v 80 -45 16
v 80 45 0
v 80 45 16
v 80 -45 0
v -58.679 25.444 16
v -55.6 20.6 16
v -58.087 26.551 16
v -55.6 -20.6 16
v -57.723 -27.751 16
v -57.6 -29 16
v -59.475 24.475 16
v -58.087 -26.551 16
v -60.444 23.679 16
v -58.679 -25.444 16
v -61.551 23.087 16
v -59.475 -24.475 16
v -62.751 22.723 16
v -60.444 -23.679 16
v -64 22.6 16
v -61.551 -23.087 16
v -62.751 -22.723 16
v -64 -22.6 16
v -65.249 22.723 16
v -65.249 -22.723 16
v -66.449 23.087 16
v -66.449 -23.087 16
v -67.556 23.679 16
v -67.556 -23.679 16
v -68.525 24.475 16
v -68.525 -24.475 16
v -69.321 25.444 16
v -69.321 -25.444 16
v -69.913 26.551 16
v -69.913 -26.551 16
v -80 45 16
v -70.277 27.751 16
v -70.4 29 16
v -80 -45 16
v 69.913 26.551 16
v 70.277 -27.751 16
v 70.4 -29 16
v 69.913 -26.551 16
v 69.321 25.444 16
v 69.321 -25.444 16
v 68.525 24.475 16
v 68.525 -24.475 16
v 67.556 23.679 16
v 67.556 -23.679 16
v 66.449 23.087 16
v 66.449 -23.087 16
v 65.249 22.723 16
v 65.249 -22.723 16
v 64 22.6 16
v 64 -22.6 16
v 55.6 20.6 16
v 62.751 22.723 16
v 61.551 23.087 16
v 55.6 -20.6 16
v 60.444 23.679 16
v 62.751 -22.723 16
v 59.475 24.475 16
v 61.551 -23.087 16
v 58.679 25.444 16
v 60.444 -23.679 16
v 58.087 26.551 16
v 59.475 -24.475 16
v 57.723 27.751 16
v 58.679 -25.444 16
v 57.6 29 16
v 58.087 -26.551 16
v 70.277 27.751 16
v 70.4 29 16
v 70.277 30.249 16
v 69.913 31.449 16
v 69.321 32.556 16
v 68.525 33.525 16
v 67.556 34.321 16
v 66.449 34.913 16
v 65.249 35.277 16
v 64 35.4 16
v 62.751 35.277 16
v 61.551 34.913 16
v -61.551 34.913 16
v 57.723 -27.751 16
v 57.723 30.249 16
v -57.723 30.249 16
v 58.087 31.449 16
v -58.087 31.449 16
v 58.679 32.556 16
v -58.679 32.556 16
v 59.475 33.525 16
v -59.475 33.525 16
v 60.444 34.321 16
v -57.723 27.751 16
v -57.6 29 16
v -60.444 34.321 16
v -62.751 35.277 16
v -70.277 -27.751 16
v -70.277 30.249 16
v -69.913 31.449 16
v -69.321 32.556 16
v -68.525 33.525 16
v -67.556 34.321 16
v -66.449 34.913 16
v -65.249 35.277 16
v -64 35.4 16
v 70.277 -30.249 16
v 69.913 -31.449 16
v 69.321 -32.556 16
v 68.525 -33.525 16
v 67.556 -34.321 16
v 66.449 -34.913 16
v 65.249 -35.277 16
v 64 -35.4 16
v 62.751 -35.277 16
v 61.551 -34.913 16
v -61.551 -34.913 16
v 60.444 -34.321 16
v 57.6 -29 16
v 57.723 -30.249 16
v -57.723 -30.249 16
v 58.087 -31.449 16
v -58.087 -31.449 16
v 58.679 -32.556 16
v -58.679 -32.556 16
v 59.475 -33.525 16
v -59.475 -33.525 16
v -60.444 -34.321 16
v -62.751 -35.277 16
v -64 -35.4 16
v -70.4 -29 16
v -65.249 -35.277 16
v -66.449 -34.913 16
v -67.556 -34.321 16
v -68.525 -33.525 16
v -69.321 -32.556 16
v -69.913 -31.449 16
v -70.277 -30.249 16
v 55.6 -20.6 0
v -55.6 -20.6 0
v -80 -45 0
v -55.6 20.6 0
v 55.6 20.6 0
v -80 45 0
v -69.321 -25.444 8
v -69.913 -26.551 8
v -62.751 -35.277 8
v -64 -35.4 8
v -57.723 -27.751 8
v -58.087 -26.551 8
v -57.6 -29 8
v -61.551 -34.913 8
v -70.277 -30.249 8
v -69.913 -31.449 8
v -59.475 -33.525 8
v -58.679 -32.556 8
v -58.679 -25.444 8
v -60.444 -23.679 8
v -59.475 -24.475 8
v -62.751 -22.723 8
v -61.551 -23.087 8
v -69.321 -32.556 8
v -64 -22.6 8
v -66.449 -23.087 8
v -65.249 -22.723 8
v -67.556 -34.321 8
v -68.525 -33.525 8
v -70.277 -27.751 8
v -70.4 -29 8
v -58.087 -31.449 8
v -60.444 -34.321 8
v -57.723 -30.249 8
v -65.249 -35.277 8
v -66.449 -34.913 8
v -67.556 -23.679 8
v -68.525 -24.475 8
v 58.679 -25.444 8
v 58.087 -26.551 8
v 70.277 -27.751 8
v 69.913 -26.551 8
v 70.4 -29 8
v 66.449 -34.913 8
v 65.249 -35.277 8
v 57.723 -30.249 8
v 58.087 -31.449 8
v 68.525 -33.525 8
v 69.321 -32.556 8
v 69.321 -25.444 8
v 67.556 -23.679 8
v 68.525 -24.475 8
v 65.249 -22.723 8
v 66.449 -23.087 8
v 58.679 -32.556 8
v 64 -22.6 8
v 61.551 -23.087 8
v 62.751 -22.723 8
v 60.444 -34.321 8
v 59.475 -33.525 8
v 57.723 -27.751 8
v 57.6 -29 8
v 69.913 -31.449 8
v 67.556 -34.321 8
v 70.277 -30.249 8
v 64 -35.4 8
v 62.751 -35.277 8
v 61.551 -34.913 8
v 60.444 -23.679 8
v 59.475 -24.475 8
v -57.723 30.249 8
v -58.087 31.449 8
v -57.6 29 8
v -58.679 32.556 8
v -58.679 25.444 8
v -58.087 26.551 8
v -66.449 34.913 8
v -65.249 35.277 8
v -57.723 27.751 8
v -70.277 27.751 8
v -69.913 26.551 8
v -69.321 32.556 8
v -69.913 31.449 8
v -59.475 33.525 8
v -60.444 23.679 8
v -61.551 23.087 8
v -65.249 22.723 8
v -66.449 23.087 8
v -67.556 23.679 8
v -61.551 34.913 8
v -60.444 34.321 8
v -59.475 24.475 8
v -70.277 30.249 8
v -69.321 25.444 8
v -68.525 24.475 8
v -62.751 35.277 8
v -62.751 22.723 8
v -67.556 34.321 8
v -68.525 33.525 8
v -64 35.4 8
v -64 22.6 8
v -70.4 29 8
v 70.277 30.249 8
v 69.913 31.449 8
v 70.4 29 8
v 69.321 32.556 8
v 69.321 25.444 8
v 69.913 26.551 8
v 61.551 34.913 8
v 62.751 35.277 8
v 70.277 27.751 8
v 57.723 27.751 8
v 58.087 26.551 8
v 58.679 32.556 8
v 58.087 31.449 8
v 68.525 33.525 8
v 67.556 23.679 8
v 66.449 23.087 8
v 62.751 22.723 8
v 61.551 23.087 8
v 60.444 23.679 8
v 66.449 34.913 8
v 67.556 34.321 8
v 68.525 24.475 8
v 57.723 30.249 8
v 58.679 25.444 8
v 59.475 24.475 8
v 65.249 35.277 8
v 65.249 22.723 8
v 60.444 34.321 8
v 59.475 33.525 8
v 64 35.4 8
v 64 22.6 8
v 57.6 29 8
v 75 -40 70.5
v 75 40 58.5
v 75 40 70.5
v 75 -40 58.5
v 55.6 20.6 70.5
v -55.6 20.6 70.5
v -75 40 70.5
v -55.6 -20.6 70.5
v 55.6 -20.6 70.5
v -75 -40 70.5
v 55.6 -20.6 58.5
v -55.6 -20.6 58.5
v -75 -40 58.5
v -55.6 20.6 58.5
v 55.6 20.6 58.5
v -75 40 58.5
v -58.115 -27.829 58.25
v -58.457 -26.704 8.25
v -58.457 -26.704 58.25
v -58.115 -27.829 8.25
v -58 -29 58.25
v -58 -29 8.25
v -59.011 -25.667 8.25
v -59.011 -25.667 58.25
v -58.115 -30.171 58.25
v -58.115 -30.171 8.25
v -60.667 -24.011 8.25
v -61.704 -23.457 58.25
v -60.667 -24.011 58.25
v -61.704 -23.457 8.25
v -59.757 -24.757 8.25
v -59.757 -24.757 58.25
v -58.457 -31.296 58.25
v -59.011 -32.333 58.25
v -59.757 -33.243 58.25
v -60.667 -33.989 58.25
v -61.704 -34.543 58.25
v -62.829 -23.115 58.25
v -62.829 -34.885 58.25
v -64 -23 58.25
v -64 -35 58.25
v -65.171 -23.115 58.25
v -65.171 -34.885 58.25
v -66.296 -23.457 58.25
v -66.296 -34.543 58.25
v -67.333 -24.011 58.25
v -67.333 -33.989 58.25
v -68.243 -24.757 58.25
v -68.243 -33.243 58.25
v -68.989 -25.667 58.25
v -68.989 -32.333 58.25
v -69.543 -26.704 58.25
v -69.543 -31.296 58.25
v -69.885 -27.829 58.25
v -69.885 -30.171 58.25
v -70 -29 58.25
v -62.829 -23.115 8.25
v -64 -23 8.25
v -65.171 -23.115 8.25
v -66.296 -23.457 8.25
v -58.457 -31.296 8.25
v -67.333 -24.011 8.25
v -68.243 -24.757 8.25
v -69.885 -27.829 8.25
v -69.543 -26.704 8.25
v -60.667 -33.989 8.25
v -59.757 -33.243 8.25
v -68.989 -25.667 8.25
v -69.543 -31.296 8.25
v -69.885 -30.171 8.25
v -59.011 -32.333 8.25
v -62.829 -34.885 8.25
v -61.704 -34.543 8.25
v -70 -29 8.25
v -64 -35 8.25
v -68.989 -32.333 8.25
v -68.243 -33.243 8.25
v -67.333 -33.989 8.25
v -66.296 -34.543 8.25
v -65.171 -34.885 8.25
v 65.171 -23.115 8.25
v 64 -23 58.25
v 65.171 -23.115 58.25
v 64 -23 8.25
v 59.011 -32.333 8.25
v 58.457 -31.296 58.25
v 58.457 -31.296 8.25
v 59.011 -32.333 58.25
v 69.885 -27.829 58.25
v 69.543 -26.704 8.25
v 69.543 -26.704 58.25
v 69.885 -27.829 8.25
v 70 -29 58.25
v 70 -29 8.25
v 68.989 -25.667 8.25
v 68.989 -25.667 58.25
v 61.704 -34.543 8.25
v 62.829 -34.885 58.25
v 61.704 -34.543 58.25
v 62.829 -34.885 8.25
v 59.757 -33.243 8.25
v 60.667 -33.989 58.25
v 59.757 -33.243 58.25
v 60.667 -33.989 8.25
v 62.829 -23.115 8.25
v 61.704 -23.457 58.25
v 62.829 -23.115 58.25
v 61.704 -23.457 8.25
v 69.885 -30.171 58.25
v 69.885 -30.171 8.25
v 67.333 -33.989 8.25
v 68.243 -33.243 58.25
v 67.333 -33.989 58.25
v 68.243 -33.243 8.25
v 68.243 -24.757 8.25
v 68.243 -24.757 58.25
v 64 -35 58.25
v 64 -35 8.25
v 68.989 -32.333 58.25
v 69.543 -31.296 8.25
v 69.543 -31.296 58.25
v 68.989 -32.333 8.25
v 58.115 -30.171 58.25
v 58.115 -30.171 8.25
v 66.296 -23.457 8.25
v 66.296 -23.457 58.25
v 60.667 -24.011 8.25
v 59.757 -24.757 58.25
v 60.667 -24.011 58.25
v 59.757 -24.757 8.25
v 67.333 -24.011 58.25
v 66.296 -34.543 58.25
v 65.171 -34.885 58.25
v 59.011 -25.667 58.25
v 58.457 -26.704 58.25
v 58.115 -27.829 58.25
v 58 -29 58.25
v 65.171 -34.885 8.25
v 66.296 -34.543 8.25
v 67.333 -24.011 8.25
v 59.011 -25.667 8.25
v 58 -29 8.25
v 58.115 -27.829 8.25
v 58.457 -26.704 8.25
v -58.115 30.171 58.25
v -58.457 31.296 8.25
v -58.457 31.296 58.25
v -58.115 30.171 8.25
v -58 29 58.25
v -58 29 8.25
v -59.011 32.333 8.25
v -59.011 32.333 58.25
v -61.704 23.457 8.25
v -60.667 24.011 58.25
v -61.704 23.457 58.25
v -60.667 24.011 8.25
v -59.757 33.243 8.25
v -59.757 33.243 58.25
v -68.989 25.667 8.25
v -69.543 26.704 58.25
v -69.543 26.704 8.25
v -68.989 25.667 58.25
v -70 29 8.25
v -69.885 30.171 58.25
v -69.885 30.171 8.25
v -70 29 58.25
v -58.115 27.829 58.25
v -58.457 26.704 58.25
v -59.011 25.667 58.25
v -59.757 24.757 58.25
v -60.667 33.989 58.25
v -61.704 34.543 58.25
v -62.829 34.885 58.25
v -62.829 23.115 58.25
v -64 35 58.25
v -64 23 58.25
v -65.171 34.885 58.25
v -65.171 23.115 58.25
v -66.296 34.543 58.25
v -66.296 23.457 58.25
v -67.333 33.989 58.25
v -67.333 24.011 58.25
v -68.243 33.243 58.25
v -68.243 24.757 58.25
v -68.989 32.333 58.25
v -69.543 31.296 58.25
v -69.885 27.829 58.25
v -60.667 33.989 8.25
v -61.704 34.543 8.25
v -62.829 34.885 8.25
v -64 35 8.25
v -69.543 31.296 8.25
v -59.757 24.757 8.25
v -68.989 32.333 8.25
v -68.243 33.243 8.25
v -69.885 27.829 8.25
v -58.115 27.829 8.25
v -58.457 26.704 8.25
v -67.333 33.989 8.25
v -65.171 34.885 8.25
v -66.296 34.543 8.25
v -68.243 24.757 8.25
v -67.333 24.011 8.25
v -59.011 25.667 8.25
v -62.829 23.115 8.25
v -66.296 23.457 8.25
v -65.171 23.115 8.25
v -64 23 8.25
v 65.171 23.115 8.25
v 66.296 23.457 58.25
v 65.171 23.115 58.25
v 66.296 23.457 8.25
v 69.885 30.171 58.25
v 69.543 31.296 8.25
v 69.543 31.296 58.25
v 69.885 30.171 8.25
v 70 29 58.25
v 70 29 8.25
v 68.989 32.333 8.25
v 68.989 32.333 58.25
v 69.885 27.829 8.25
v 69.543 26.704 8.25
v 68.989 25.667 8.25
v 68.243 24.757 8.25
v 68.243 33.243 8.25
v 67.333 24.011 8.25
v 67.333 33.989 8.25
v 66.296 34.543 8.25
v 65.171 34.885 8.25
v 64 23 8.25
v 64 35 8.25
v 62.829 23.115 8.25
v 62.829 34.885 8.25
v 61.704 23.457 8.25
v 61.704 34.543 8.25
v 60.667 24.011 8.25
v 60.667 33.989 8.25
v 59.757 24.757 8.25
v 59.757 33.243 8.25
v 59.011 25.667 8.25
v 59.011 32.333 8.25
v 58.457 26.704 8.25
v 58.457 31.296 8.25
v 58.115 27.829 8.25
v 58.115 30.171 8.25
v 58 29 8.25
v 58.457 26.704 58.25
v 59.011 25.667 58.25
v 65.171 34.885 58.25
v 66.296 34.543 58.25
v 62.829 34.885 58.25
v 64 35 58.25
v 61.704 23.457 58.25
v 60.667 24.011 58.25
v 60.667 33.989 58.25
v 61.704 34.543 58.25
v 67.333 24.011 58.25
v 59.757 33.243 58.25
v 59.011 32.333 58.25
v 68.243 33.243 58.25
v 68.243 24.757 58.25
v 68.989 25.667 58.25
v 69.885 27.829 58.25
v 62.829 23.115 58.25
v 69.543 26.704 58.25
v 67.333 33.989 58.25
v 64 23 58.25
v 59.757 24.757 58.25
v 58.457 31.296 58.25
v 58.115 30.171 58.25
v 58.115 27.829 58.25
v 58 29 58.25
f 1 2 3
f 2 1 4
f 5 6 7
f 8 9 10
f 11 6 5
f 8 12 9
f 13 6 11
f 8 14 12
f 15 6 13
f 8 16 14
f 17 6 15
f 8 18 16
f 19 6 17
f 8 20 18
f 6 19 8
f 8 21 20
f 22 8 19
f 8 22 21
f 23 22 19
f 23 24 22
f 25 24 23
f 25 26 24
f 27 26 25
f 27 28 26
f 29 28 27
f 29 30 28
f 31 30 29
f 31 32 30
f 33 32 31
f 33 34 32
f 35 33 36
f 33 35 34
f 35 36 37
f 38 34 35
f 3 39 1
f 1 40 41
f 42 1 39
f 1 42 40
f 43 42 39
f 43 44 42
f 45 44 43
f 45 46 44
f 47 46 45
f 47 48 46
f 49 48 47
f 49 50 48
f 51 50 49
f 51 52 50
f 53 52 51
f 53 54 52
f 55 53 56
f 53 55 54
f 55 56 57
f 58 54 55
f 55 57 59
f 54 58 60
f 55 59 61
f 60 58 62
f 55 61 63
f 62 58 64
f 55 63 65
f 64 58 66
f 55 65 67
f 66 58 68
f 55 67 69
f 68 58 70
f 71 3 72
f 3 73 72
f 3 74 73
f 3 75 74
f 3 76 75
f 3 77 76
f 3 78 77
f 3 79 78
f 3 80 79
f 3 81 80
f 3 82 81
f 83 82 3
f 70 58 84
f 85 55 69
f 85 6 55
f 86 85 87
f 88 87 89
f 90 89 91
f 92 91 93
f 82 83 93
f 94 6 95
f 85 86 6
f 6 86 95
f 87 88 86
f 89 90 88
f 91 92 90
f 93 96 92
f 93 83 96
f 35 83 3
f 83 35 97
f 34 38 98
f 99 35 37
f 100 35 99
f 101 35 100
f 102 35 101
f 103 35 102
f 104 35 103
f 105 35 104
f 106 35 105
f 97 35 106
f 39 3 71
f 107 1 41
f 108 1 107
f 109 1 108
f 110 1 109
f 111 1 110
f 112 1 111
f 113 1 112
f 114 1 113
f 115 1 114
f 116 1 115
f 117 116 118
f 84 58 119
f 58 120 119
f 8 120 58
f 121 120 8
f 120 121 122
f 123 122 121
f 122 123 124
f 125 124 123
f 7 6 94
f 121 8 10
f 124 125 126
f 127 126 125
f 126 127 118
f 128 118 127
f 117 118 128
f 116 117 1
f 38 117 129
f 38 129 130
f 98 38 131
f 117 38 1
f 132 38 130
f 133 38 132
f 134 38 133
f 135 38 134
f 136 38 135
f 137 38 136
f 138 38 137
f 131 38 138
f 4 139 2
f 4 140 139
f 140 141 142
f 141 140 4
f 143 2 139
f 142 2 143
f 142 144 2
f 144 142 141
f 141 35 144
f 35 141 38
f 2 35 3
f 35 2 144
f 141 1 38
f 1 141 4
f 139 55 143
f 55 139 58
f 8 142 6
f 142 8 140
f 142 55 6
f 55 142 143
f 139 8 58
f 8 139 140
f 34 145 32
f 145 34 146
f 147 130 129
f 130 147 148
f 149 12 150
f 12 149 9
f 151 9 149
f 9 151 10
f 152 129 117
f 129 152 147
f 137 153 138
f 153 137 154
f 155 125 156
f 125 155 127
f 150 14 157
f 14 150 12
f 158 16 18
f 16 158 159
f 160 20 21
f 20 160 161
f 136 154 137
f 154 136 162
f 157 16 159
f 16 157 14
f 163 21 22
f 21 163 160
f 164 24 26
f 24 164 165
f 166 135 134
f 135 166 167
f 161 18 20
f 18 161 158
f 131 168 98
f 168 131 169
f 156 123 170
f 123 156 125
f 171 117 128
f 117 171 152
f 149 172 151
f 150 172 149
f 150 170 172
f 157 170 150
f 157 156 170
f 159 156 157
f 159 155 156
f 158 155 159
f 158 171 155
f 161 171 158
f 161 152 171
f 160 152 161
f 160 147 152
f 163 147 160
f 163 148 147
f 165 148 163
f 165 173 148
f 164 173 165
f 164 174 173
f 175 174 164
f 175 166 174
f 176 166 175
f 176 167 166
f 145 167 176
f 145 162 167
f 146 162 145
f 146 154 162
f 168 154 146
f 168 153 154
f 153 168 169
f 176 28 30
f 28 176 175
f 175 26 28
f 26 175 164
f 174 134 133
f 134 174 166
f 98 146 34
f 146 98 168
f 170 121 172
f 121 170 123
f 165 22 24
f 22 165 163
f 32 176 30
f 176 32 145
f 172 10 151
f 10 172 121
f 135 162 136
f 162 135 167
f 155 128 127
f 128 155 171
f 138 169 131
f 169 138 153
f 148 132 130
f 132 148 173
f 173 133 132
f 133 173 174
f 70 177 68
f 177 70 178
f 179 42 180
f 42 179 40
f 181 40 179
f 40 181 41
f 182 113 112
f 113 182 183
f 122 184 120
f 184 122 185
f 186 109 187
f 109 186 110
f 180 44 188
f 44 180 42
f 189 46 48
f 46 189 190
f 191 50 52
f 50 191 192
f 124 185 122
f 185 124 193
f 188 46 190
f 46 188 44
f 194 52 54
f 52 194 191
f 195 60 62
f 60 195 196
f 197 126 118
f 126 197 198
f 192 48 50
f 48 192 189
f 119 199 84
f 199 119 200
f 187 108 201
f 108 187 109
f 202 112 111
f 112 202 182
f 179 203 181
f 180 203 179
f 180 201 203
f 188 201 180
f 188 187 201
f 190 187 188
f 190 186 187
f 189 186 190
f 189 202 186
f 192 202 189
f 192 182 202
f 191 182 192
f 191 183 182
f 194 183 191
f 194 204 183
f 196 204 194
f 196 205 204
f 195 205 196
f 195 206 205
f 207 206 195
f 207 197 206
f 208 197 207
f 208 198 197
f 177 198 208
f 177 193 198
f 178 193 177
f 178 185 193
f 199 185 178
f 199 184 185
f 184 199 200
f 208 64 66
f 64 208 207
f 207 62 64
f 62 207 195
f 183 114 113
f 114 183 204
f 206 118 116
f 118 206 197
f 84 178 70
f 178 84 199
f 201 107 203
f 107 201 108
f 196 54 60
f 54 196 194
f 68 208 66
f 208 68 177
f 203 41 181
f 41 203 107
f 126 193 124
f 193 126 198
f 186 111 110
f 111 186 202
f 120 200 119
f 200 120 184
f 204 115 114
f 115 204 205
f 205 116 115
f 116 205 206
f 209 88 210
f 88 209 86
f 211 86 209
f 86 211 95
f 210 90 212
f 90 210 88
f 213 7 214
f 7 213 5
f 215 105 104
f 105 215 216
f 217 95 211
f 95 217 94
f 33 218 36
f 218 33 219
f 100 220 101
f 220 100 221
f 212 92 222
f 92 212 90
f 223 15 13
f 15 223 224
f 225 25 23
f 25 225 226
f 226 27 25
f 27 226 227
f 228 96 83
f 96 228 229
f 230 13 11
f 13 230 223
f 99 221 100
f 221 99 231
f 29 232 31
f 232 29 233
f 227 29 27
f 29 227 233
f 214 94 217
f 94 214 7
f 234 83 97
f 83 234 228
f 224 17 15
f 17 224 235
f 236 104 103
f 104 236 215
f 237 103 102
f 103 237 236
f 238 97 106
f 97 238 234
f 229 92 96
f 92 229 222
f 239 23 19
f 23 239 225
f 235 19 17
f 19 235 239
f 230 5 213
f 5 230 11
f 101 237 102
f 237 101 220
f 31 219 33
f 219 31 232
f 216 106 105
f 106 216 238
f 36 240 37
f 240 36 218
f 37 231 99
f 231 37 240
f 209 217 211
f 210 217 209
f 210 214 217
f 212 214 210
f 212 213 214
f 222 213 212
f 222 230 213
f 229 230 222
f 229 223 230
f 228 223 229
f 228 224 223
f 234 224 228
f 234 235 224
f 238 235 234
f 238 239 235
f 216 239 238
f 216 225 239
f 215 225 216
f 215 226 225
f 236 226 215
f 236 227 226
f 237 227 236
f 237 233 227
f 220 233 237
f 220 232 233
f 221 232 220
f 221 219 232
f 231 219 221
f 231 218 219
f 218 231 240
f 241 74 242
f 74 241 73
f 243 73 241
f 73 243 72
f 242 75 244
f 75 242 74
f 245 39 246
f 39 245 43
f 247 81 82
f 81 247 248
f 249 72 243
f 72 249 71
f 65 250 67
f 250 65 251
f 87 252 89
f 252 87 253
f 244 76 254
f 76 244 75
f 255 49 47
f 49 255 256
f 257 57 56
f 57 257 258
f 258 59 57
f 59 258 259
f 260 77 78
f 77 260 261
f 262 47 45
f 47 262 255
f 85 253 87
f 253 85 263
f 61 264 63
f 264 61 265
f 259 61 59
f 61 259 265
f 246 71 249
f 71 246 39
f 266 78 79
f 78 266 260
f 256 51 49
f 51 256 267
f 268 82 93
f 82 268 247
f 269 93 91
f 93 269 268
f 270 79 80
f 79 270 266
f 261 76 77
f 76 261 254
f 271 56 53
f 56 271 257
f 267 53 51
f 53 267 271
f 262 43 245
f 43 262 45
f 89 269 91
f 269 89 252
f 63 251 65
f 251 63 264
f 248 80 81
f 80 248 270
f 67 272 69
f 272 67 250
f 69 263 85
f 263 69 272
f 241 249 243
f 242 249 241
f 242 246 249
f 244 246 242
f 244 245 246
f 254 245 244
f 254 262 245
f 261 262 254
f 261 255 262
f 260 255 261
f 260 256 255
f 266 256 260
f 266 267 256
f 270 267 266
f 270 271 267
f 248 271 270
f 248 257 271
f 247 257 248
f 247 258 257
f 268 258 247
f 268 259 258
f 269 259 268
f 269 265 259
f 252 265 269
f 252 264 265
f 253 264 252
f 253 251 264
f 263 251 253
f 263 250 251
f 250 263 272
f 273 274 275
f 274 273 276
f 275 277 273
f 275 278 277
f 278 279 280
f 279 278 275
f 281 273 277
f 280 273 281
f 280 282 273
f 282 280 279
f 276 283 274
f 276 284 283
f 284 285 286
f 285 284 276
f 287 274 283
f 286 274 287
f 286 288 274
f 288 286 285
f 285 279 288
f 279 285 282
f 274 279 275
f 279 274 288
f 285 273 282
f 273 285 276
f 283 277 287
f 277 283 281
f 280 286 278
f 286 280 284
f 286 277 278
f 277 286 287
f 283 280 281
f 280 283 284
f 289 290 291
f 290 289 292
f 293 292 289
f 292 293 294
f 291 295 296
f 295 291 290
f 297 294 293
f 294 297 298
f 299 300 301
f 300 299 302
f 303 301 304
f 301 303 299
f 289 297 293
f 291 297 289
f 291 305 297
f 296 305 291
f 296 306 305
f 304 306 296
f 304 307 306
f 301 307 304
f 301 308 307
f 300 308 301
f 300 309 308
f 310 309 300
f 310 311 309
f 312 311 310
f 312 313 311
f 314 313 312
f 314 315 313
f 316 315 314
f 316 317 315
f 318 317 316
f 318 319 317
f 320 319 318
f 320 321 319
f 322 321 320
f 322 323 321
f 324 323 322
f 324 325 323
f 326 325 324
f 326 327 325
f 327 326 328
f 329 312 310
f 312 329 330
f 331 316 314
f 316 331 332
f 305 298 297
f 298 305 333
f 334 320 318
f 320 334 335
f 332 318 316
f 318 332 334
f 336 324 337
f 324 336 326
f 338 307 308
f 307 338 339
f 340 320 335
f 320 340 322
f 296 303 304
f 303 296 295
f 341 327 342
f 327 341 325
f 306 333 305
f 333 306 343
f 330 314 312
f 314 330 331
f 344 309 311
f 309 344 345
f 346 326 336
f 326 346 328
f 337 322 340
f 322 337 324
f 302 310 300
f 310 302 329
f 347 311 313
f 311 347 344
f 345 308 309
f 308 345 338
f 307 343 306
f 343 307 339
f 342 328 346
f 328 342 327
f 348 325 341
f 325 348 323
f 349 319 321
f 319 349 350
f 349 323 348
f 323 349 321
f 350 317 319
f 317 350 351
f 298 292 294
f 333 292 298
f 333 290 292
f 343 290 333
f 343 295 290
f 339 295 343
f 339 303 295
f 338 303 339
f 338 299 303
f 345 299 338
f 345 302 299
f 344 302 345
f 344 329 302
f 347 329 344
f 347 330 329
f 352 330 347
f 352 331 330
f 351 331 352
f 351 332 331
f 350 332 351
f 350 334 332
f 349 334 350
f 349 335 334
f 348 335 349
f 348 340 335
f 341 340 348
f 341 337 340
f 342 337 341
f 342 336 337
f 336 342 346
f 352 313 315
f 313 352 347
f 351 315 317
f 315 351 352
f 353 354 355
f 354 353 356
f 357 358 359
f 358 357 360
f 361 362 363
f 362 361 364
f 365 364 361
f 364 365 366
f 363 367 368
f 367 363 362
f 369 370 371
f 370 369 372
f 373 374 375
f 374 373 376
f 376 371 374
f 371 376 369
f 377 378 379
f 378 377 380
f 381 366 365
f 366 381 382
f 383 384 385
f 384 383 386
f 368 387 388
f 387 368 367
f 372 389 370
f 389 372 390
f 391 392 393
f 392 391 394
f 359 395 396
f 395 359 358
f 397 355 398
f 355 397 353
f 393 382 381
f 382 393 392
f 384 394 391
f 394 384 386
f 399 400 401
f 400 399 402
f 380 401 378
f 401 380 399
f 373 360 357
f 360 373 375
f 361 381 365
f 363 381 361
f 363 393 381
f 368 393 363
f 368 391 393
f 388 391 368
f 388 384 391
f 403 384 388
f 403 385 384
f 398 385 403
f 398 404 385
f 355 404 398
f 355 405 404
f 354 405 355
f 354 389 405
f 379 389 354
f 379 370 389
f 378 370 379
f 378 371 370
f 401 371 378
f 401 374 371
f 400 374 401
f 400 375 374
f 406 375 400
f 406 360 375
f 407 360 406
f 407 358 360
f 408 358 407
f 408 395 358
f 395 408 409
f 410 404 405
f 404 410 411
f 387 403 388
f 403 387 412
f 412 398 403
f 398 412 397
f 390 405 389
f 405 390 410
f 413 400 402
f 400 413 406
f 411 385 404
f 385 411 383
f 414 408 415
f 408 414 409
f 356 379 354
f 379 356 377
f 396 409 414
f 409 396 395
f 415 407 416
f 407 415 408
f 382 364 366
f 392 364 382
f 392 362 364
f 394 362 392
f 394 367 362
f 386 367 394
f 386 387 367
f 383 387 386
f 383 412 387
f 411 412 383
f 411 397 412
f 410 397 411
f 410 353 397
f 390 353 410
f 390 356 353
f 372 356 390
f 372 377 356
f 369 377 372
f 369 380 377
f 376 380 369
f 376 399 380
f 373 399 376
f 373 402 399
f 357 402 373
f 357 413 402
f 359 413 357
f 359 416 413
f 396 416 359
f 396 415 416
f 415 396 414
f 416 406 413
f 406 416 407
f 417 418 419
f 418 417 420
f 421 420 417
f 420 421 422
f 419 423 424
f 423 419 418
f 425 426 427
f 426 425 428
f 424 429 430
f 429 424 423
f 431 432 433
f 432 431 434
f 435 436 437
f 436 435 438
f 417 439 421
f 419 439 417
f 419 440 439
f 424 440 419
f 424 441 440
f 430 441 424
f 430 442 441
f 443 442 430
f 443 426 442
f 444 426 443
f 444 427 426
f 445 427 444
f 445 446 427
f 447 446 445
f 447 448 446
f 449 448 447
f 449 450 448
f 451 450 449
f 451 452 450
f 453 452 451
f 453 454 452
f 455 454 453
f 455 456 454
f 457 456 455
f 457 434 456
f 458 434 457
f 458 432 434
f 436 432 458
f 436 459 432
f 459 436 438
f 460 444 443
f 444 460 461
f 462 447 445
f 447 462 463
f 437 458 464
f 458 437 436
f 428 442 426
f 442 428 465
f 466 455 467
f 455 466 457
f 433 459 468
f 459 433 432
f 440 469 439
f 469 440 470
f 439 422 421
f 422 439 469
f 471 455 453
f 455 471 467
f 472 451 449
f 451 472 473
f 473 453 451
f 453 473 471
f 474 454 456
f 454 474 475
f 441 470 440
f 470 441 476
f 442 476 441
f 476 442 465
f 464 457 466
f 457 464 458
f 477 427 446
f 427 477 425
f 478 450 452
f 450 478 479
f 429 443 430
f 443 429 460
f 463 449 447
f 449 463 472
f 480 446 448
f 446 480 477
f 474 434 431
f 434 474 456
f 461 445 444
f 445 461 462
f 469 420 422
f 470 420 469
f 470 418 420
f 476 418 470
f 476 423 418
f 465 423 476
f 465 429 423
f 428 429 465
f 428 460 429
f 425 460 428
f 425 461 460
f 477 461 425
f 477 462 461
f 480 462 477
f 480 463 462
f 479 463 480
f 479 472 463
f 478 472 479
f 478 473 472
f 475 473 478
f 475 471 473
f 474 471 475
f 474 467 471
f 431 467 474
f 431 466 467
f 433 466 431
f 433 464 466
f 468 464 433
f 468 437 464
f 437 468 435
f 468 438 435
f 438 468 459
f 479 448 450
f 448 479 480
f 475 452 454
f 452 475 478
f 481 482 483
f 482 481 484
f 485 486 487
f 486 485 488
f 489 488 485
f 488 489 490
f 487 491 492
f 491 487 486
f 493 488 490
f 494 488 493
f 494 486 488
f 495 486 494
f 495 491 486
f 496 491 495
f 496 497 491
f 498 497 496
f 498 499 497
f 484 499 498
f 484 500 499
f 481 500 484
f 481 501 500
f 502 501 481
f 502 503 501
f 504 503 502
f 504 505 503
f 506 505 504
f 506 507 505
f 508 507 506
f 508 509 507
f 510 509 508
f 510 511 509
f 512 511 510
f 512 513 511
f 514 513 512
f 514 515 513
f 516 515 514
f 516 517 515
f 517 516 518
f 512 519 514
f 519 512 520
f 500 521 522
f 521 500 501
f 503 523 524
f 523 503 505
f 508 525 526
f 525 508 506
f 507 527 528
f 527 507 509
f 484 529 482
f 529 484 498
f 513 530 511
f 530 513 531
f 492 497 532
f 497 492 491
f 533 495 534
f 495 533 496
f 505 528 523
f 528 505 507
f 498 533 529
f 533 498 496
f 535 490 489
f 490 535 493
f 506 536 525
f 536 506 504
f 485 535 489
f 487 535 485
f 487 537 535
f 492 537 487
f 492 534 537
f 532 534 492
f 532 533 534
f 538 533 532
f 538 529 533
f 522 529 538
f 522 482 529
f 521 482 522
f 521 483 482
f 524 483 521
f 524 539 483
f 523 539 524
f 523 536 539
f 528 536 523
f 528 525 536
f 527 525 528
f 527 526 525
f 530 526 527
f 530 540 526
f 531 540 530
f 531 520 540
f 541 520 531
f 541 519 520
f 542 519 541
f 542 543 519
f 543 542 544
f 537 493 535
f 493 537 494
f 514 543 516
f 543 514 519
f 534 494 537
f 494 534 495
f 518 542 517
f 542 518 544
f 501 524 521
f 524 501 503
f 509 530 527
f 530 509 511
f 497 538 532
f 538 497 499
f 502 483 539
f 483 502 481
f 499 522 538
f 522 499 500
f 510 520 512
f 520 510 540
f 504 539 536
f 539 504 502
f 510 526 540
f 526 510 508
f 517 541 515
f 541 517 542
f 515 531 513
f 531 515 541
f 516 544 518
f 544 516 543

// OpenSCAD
$fn = 32;

// ------------------------------------------------------------------------
// Frame cube: base 160 x 90 mm, posts 50 mm tall
// Every part is its own module, assembly() places every instance.
// ------------------------------------------------------------------------

// --- part 1 ---
module base_frame() {
  difference() {
    translate([-80, -45, 0]) cube([160, 90, 16]);
    translate([-55.6, -20.6, -1]) cube([111.2, 41.2, 18]);
    translate([-64, -29, 8]) cylinder(h = 9, d = 12.8);
    translate([64, -29, 8]) cylinder(h = 9, d = 12.8);
    translate([-64, 29, 8]) cylinder(h = 9, d = 12.8);
    translate([64, 29, 8]) cylinder(h = 9, d = 12.8);
  }
}

// --- part 2 ---
module corner_post() {
  cylinder(h = 50, d = 12);
}

// --- part 3 ---
module top_frame() {
  difference() {
    translate([-75, -40, 0]) cube([150, 80, 12]);
    translate([-55.6, -20.6, -1]) cube([111.2, 41.2, 14]);
  }
}

// --- assembly ---
module assembly() {
  color([0.80, 0.24, 0.20]) translate([0, 0, 0]) rotate([0, 0, 0]) base_frame();
  color([0.20, 0.45, 0.75]) translate([-64, -29, 8.25]) rotate([0, 0, 0]) corner_post();
  color([0.25, 0.62, 0.32]) translate([64, -29, 8.25]) rotate([0, 0, 0]) corner_post();
  color([0.92, 0.70, 0.18]) translate([-64, 29, 8.25]) rotate([0, 0, 0]) corner_post();
  color([0.58, 0.35, 0.70]) translate([64, 29, 8.25]) rotate([0, 0, 0]) corner_post();
  color([0.16, 0.66, 0.66]) translate([0, 0, 58.5]) rotate([0, 0, 0]) top_frame();
}

assembly();
